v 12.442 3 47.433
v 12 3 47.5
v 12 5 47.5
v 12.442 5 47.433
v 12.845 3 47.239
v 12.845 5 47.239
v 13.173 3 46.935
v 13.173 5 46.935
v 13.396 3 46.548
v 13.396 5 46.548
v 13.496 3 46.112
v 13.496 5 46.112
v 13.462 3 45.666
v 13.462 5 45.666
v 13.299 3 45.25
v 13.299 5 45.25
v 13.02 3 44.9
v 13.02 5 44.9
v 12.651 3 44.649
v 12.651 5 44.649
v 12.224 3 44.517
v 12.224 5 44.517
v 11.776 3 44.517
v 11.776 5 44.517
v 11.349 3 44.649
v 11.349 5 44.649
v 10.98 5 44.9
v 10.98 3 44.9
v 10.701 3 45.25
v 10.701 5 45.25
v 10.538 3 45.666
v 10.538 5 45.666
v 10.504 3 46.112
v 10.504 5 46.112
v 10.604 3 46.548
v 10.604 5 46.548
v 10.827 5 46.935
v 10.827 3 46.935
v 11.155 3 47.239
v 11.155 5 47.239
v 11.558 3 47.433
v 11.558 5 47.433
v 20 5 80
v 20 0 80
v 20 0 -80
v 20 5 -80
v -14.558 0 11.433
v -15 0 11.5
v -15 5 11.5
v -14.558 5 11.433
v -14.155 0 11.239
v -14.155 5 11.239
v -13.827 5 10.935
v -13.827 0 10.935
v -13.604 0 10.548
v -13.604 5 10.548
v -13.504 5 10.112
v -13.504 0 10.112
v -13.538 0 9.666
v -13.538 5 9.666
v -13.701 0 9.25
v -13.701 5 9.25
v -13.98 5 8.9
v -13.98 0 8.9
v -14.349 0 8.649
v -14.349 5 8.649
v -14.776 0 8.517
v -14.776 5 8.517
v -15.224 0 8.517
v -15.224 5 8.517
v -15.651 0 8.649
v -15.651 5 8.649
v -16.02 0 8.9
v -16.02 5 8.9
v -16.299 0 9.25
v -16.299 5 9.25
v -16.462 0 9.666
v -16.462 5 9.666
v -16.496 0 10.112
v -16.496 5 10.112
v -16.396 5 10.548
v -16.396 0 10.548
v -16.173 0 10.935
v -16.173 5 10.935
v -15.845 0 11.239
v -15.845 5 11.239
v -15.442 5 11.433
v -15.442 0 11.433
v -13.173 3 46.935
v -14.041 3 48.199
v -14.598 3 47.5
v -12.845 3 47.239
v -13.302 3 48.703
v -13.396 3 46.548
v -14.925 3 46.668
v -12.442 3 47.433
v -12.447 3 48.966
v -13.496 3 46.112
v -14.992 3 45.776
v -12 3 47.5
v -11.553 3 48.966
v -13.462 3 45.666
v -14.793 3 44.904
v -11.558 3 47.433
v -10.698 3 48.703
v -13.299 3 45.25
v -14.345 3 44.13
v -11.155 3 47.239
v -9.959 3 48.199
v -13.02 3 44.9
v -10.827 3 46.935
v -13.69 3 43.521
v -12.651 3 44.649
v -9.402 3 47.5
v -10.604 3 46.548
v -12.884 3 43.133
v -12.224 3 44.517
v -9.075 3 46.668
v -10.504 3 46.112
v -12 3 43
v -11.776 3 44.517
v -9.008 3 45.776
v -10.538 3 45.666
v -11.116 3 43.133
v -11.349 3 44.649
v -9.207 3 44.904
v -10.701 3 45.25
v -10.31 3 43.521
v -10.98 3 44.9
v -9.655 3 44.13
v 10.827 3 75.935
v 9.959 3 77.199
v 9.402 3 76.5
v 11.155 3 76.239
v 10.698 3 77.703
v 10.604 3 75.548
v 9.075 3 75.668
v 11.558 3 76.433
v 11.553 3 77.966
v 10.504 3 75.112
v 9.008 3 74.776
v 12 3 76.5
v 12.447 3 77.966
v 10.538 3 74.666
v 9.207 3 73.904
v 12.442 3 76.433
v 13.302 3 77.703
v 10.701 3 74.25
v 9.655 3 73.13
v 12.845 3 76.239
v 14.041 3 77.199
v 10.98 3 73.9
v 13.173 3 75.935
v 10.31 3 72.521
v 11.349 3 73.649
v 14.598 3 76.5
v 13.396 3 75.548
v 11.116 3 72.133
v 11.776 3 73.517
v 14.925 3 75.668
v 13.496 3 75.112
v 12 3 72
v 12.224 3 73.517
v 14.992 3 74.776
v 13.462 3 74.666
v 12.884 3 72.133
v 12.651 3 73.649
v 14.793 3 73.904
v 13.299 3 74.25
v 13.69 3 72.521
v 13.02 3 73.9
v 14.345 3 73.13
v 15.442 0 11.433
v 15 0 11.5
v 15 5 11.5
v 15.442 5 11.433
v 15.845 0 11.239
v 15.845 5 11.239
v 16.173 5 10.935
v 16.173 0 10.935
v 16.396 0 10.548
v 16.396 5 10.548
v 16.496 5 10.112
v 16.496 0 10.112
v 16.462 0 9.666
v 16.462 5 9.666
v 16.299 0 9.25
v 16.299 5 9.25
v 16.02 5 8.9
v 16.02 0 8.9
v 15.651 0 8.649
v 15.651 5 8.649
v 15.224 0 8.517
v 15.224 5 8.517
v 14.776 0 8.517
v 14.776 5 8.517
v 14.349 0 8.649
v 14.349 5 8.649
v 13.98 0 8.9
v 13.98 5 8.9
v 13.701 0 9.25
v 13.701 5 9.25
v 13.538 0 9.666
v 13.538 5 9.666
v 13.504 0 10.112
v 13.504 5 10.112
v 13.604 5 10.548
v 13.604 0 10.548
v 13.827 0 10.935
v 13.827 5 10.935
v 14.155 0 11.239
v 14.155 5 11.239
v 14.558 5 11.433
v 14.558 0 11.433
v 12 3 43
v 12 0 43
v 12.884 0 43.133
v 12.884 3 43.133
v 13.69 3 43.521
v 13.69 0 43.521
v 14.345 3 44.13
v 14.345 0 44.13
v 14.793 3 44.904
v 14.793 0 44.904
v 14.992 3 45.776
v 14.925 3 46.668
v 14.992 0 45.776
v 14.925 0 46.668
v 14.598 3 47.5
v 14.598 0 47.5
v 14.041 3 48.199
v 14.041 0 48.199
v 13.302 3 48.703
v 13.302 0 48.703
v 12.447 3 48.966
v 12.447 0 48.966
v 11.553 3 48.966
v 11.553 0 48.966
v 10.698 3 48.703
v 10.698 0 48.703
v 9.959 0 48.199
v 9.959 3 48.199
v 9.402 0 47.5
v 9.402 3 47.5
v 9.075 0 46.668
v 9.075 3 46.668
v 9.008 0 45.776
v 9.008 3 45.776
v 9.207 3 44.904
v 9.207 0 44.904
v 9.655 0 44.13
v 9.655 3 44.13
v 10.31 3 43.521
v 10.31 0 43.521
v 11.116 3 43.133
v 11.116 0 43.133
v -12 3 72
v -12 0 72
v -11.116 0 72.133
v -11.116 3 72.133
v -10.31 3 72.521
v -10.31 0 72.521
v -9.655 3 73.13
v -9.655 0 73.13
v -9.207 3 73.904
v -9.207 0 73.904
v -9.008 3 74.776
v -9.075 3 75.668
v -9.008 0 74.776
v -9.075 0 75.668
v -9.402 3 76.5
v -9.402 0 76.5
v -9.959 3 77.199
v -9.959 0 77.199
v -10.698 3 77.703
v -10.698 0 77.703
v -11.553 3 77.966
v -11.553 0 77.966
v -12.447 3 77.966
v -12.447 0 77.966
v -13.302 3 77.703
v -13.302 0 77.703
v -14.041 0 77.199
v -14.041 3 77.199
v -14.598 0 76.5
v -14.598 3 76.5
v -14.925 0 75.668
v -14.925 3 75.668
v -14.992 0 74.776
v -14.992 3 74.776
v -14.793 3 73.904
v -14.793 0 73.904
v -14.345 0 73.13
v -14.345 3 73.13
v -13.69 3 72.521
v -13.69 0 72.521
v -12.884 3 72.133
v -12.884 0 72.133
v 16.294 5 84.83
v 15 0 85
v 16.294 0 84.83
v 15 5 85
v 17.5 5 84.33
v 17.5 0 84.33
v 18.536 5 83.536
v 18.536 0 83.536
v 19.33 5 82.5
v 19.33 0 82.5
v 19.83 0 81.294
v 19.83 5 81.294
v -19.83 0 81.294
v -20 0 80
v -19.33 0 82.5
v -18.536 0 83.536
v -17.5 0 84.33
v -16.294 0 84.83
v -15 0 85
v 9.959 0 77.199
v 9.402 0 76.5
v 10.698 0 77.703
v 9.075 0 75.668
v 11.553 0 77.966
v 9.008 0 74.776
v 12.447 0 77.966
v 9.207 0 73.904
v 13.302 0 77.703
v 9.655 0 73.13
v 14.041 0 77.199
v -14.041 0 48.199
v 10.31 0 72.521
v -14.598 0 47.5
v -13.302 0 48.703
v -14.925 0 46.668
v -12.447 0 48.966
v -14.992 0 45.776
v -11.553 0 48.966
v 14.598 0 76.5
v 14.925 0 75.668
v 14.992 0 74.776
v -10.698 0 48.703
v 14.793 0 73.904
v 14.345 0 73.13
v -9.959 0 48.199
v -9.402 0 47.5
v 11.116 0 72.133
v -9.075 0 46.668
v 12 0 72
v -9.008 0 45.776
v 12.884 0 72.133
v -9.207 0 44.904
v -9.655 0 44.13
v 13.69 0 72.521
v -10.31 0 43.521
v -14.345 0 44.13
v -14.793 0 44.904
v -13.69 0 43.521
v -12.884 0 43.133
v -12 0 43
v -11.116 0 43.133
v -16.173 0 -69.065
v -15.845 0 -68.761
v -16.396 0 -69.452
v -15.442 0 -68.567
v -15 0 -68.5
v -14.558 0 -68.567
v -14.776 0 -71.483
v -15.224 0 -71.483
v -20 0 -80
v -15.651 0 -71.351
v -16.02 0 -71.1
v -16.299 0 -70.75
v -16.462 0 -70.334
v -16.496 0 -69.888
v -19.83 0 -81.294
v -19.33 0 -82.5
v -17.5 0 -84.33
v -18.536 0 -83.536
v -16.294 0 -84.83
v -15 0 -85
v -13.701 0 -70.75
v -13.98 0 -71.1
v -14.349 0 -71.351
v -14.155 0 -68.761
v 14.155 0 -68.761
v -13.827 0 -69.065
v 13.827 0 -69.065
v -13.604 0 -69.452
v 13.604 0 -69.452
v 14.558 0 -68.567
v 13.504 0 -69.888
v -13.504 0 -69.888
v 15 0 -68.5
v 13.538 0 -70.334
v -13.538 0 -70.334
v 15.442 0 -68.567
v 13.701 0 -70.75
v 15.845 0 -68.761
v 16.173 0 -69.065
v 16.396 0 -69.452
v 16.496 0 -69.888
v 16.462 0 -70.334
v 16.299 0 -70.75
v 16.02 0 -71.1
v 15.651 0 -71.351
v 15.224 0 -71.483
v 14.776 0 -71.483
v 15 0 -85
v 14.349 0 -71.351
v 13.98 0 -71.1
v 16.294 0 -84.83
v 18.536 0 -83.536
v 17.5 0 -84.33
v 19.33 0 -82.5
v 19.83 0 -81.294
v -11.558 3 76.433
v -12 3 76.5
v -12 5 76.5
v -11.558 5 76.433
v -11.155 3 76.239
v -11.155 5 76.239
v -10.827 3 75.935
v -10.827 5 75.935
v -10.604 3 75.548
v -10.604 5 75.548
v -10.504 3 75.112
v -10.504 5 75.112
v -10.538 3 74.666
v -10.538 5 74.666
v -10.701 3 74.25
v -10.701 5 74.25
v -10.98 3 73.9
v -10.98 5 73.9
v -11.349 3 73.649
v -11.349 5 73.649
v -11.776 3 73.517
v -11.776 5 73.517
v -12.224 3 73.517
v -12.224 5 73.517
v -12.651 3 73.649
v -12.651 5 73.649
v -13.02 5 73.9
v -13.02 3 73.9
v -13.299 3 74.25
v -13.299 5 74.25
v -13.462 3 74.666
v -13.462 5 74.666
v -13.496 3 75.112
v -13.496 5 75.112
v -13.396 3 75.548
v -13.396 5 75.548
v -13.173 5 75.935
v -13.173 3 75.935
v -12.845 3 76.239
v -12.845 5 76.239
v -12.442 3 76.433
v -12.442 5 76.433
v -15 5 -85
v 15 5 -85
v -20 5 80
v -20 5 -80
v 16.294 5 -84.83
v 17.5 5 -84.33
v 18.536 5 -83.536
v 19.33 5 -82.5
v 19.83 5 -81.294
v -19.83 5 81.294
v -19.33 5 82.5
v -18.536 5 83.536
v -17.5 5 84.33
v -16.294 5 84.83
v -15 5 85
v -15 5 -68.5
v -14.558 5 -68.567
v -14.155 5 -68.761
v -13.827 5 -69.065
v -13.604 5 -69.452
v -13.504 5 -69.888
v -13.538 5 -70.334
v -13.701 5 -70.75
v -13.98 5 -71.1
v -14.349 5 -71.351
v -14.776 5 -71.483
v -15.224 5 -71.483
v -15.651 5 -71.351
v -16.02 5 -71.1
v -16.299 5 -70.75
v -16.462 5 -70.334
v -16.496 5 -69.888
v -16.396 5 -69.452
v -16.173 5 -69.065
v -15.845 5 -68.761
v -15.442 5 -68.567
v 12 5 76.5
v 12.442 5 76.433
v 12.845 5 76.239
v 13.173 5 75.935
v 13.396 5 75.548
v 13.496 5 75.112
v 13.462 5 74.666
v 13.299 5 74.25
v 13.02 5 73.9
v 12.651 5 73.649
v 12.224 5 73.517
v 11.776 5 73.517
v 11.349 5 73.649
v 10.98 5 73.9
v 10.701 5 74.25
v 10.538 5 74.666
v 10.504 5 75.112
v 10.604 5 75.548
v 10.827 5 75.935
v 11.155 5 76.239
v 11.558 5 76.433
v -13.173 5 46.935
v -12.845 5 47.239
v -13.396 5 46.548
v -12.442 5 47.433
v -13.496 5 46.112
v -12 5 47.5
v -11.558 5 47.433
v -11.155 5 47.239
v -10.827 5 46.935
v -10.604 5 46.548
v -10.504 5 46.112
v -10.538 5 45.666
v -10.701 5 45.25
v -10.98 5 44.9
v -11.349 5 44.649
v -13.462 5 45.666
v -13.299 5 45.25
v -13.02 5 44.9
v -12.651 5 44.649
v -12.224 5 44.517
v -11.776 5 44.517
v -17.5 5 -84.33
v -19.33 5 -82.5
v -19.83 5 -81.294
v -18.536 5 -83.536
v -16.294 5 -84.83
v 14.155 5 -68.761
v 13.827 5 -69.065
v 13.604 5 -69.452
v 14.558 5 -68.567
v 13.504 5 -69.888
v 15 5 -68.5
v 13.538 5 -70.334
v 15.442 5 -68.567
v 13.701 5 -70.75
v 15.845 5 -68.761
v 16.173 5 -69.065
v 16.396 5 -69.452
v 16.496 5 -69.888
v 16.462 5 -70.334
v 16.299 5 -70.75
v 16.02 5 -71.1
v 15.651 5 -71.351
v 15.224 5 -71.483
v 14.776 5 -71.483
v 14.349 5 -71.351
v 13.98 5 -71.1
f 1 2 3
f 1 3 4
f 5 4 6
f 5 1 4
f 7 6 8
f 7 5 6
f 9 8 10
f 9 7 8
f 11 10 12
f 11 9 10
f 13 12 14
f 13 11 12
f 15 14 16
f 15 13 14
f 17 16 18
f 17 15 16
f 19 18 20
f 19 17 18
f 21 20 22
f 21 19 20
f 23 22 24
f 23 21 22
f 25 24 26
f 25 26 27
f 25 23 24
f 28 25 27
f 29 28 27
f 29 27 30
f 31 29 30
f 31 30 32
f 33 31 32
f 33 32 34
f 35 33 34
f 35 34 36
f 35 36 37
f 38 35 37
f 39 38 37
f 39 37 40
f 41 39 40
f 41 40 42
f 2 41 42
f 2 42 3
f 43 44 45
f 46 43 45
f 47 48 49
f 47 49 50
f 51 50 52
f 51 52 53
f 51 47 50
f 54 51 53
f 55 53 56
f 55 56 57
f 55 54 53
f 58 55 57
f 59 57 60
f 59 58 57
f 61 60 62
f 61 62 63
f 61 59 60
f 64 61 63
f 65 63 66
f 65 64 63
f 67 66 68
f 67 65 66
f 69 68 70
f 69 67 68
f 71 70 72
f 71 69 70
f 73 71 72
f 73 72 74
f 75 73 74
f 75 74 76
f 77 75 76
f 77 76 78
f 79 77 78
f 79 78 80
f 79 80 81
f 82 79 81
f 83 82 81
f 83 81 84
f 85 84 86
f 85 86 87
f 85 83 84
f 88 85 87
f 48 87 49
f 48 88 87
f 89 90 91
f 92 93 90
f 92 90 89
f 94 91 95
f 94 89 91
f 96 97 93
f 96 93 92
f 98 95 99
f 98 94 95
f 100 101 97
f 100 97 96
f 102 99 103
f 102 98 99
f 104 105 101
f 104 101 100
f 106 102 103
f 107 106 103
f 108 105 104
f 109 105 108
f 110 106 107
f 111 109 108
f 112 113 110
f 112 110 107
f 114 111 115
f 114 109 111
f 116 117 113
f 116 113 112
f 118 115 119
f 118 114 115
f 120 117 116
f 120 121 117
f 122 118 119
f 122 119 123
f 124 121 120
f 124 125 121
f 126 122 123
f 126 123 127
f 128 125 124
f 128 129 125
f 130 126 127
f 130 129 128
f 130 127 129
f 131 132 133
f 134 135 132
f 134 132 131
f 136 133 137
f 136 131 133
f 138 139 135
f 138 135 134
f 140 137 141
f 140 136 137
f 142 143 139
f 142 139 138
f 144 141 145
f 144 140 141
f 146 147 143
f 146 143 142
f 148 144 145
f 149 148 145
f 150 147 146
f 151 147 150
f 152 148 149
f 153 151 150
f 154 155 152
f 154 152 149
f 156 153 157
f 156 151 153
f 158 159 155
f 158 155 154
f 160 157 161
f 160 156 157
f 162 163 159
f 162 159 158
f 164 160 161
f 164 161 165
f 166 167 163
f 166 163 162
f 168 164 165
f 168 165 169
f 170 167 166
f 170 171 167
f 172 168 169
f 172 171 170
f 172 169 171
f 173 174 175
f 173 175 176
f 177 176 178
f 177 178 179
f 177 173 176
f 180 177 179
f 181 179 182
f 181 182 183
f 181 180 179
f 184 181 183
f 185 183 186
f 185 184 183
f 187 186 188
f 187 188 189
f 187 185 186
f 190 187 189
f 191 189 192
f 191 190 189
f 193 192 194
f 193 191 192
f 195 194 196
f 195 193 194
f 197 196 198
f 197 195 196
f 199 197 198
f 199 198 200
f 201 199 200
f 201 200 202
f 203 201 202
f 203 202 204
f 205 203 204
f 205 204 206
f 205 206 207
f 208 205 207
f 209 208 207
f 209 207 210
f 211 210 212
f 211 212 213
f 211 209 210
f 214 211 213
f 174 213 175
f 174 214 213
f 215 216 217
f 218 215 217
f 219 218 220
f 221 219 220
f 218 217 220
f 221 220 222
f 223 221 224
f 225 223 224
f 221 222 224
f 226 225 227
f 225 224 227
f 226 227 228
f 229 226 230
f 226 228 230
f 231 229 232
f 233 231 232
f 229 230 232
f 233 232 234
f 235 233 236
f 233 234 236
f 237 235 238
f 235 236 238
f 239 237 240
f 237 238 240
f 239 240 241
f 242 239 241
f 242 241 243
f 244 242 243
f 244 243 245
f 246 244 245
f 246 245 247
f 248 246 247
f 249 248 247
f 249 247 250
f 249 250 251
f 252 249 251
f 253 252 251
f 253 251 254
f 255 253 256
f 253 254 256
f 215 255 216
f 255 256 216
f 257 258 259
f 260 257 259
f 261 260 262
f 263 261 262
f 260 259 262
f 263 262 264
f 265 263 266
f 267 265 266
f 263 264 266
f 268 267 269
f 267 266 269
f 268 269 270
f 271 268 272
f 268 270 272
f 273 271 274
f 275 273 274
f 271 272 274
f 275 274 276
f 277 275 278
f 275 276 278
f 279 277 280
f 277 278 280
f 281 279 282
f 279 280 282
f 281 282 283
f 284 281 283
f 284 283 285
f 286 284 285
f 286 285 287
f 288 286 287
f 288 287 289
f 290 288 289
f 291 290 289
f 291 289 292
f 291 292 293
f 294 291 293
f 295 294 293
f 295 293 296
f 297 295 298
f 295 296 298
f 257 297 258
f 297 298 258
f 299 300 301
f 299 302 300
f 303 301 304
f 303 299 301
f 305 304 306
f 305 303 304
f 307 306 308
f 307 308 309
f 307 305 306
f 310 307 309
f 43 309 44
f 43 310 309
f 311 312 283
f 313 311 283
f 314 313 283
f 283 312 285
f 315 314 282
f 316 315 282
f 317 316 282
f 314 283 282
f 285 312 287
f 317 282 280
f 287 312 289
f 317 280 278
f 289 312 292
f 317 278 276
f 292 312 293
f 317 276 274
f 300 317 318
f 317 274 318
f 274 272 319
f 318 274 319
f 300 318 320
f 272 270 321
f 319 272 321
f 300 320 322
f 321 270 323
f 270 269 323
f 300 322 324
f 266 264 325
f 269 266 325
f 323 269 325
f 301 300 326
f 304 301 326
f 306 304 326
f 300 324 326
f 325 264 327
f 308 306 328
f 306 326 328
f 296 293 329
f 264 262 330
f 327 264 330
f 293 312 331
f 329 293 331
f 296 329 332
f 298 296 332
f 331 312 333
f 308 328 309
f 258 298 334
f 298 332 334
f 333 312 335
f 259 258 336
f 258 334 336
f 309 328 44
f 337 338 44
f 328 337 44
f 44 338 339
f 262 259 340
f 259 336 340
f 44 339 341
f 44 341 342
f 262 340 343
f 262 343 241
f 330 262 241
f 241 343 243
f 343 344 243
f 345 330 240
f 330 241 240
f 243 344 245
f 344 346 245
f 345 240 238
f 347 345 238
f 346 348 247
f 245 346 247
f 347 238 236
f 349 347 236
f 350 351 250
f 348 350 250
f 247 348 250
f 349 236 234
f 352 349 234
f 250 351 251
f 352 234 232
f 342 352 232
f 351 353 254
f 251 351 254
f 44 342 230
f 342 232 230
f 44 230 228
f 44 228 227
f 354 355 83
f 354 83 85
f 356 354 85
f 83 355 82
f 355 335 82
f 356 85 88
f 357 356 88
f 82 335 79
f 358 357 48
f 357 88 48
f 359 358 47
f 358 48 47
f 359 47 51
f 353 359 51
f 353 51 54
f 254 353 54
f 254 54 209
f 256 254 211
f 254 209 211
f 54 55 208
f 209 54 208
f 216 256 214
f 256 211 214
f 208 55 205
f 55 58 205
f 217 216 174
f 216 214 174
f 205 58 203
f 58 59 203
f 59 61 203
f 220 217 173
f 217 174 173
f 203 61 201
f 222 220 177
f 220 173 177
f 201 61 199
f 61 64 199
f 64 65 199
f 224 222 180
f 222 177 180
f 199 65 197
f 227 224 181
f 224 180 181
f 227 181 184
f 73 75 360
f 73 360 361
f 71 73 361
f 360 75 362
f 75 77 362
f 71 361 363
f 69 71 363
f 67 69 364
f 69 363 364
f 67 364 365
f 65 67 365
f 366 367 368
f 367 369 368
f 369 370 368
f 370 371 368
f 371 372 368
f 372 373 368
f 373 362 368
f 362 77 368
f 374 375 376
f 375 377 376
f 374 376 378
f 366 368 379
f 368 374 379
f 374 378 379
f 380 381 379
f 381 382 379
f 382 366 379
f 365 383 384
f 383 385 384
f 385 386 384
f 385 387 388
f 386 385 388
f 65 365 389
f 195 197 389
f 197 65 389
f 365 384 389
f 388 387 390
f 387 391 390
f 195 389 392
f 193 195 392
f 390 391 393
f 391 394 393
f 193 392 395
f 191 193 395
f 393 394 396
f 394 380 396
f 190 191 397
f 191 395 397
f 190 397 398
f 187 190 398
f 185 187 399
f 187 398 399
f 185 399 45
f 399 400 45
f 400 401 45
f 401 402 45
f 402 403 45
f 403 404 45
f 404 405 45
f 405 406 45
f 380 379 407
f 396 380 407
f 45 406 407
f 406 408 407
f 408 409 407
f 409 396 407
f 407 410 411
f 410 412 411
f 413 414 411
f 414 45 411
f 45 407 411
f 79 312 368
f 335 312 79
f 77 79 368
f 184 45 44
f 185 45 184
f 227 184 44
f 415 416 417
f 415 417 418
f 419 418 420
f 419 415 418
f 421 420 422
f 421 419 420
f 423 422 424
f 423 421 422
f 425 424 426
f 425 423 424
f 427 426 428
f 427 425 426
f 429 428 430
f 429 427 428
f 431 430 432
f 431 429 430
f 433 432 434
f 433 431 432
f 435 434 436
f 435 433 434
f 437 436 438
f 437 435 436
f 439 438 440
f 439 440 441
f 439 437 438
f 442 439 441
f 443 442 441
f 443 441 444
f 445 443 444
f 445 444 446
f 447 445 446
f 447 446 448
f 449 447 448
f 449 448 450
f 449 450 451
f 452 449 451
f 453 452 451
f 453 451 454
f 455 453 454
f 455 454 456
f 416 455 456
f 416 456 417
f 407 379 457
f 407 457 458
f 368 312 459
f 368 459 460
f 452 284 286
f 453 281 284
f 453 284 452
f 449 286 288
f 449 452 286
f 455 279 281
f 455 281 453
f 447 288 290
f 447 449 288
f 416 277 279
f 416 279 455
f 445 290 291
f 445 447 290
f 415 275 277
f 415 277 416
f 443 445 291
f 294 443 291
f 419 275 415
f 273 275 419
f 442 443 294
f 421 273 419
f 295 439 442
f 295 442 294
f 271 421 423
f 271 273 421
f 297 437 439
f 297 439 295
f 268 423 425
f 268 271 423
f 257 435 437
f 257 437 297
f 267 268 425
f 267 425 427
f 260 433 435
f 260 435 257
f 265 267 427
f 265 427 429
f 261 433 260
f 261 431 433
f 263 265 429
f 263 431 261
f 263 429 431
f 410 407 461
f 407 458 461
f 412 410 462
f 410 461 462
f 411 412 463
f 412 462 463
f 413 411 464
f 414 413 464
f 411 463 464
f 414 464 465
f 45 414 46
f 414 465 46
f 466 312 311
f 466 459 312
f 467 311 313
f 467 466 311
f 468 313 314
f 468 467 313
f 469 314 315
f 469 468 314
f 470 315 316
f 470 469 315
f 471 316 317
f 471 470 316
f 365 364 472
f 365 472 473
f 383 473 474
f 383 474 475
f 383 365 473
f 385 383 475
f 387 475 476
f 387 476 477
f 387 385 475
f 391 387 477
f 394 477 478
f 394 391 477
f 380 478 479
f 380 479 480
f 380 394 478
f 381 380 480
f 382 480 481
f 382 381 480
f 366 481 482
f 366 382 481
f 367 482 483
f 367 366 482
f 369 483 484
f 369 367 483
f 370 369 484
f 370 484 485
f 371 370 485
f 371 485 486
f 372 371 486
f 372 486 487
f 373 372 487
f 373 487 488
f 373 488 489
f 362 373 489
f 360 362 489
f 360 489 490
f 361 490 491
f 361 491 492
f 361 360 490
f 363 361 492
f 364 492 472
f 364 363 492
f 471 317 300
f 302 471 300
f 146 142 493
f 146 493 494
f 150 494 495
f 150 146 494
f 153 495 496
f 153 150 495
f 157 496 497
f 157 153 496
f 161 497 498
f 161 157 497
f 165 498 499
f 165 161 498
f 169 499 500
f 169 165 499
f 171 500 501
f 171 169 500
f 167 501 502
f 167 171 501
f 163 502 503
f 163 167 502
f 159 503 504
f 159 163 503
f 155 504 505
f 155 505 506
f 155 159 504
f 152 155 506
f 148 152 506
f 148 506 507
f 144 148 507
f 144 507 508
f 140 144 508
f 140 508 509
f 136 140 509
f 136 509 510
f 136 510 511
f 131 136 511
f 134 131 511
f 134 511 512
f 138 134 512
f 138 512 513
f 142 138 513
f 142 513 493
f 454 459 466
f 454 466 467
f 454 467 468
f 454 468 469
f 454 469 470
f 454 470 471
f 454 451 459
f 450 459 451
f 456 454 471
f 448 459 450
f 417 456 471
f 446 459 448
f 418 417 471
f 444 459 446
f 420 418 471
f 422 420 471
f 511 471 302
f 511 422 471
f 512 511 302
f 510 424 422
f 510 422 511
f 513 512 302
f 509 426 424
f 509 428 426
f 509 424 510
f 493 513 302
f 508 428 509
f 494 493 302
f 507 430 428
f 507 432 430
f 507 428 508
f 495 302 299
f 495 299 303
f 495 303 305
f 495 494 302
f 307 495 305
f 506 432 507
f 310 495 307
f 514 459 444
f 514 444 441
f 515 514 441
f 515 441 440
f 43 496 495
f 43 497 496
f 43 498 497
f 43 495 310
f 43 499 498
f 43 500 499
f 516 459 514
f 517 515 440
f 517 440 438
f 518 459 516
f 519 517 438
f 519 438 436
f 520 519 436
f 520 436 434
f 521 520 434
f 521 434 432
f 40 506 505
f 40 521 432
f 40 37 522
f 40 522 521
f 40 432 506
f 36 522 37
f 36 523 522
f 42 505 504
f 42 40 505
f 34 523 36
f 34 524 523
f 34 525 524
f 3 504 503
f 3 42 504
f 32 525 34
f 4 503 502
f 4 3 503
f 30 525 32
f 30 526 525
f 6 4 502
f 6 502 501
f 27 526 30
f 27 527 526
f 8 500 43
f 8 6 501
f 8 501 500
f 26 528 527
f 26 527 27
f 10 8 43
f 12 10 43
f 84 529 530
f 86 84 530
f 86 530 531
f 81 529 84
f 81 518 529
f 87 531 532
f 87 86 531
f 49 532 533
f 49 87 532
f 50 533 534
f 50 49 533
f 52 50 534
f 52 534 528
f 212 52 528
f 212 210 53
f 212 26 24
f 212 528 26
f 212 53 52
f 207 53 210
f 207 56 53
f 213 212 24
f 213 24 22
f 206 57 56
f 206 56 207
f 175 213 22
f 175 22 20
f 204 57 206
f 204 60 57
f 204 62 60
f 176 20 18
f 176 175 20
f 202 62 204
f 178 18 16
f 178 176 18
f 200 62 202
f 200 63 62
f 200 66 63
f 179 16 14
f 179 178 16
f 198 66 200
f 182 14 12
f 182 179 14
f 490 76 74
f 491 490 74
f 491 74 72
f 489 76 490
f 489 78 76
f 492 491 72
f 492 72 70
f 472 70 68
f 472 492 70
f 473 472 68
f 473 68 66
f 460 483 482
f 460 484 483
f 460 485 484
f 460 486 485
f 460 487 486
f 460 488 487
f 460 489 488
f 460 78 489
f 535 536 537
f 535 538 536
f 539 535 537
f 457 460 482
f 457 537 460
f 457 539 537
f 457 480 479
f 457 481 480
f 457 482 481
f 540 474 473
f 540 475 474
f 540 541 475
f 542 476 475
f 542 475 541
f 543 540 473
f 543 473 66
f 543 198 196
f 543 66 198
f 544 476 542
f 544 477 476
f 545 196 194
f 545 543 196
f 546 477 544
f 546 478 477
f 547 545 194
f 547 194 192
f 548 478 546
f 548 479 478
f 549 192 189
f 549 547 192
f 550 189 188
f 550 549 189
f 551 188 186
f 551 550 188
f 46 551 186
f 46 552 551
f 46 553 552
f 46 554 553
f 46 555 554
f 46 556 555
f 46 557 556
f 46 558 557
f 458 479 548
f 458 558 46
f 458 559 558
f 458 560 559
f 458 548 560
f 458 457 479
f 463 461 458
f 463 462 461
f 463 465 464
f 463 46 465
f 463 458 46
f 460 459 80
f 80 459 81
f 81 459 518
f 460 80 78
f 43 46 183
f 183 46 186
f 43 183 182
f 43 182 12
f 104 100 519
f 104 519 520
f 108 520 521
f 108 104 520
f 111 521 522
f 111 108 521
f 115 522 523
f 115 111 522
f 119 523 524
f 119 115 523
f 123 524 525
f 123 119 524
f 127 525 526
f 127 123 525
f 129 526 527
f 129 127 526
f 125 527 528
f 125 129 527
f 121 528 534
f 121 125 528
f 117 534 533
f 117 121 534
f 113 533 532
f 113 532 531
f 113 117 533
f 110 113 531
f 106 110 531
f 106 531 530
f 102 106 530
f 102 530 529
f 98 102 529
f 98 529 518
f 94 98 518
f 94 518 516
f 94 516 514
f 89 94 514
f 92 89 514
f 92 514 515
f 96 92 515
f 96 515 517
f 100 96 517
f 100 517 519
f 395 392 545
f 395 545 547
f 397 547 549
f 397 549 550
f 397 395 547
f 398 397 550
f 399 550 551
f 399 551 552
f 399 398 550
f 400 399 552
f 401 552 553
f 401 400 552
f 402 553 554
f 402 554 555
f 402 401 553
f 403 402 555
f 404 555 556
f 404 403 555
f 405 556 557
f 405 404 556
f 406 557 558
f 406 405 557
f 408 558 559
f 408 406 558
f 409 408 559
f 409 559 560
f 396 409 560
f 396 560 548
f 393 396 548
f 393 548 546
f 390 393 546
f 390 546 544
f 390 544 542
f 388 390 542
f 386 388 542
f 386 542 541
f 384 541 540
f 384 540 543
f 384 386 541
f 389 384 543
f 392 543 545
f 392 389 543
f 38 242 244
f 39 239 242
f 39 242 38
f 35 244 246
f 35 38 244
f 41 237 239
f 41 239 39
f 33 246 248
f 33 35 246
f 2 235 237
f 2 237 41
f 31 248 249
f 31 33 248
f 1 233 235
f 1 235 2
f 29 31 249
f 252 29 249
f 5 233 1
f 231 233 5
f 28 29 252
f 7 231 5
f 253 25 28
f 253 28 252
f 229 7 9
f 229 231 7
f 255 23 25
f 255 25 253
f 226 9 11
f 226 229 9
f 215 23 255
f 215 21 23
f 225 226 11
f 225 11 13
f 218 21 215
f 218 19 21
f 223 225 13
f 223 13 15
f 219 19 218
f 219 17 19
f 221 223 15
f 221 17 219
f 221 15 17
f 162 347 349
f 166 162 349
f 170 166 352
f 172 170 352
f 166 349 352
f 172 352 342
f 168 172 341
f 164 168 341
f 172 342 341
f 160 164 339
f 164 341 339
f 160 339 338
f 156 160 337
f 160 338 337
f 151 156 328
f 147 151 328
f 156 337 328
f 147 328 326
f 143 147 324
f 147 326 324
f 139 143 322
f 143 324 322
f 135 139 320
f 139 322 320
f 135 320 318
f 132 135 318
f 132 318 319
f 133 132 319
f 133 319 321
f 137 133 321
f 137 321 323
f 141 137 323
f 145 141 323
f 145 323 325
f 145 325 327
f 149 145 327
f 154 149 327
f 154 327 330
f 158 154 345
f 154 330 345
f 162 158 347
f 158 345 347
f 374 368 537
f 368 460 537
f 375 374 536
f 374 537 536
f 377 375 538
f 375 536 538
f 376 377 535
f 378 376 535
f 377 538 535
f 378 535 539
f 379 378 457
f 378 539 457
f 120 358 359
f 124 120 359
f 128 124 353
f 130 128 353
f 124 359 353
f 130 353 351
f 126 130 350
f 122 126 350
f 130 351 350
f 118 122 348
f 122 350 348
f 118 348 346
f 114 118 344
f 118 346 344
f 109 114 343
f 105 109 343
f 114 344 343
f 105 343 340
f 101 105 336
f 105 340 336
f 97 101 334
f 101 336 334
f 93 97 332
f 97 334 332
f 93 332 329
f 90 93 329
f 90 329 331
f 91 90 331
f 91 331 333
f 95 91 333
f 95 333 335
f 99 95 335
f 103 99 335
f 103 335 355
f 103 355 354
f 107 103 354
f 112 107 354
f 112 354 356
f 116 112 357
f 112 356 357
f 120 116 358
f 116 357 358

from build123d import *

# Parameters (mm, degrees)
SKETCH_1_W          = 40
SKETCH_1_H          = 170
SKETCH_1_R          = 1.5
EXTRUDE_1_DEPTH     = 5
FILLET_1_R          = 5
SKETCH_2_R          = 3
CUT_EXTRUDE_1_DEPTH = 3


with BuildPart() as part:
    # 草图1 → 凸台-拉伸1 (new body)
    with BuildSketch(Plane(origin=(0, 0, 0), x_dir=(1, 0, 0), z_dir=(0, 1, 0))):
        Rectangle(SKETCH_1_W, SKETCH_1_H)
        with Locations(Location((-15, 70, 0), (0, 0, 270))):
            Circle(SKETCH_1_R, mode=Mode.SUBTRACT)
        with Locations(Location((15, 70, 0), (0, 0, 270))):
            Circle(SKETCH_1_R, mode=Mode.SUBTRACT)
        with Locations(Location((15, -10, 0), (0, 0, 270))):
            Circle(SKETCH_1_R, mode=Mode.SUBTRACT)
        with Locations(Location((-15, -10, 0), (0, 0, 270))):
            Circle(SKETCH_1_R, mode=Mode.SUBTRACT)
        with Locations(Location((12, -46, 0), (0, 0, 270))):
            Circle(SKETCH_1_R, mode=Mode.SUBTRACT)
        with Locations(Location((-12, -46, 0), (0, 0, 270))):
            Circle(SKETCH_1_R, mode=Mode.SUBTRACT)
        with Locations(Location((-12, -75, 0), (0, 0, 270))):
            Circle(SKETCH_1_R, mode=Mode.SUBTRACT)
        with Locations(Location((12, -75, 0), (0, 0, 270))):
            Circle(SKETCH_1_R, mode=Mode.SUBTRACT)
    extrude(amount=EXTRUDE_1_DEPTH)

    # 圆角1
    fillet_1_edges = [part.edges().sort_by_distance(p)[0] for p in [
        (20, 2.5, 85),
        (-20, 2.5, 85),
        (-20, 2.5, -85),
        (20, 2.5, -85),
    ]]
    fillet(fillet_1_edges, radius=FILLET_1_R)

    # 草图2 → 切除-拉伸1 (cut)
    with BuildSketch(Plane.XZ):
        with Locations(Location((-12, 75, 0), (0, 0, 270))):
            Circle(SKETCH_2_R)
        with Locations(Location((12, 75, 0), (0, 0, 270))):
            Circle(SKETCH_2_R)
        with Locations(Location((12, 46, 0), (0, 0, 270))):
            Circle(SKETCH_2_R)
        with Locations(Location((-12, 46, 0), (0, 0, 270))):
            Circle(SKETCH_2_R)
    extrude(amount=-CUT_EXTRUDE_1_DEPTH, mode=Mode.SUBTRACT)


solid = part.part
